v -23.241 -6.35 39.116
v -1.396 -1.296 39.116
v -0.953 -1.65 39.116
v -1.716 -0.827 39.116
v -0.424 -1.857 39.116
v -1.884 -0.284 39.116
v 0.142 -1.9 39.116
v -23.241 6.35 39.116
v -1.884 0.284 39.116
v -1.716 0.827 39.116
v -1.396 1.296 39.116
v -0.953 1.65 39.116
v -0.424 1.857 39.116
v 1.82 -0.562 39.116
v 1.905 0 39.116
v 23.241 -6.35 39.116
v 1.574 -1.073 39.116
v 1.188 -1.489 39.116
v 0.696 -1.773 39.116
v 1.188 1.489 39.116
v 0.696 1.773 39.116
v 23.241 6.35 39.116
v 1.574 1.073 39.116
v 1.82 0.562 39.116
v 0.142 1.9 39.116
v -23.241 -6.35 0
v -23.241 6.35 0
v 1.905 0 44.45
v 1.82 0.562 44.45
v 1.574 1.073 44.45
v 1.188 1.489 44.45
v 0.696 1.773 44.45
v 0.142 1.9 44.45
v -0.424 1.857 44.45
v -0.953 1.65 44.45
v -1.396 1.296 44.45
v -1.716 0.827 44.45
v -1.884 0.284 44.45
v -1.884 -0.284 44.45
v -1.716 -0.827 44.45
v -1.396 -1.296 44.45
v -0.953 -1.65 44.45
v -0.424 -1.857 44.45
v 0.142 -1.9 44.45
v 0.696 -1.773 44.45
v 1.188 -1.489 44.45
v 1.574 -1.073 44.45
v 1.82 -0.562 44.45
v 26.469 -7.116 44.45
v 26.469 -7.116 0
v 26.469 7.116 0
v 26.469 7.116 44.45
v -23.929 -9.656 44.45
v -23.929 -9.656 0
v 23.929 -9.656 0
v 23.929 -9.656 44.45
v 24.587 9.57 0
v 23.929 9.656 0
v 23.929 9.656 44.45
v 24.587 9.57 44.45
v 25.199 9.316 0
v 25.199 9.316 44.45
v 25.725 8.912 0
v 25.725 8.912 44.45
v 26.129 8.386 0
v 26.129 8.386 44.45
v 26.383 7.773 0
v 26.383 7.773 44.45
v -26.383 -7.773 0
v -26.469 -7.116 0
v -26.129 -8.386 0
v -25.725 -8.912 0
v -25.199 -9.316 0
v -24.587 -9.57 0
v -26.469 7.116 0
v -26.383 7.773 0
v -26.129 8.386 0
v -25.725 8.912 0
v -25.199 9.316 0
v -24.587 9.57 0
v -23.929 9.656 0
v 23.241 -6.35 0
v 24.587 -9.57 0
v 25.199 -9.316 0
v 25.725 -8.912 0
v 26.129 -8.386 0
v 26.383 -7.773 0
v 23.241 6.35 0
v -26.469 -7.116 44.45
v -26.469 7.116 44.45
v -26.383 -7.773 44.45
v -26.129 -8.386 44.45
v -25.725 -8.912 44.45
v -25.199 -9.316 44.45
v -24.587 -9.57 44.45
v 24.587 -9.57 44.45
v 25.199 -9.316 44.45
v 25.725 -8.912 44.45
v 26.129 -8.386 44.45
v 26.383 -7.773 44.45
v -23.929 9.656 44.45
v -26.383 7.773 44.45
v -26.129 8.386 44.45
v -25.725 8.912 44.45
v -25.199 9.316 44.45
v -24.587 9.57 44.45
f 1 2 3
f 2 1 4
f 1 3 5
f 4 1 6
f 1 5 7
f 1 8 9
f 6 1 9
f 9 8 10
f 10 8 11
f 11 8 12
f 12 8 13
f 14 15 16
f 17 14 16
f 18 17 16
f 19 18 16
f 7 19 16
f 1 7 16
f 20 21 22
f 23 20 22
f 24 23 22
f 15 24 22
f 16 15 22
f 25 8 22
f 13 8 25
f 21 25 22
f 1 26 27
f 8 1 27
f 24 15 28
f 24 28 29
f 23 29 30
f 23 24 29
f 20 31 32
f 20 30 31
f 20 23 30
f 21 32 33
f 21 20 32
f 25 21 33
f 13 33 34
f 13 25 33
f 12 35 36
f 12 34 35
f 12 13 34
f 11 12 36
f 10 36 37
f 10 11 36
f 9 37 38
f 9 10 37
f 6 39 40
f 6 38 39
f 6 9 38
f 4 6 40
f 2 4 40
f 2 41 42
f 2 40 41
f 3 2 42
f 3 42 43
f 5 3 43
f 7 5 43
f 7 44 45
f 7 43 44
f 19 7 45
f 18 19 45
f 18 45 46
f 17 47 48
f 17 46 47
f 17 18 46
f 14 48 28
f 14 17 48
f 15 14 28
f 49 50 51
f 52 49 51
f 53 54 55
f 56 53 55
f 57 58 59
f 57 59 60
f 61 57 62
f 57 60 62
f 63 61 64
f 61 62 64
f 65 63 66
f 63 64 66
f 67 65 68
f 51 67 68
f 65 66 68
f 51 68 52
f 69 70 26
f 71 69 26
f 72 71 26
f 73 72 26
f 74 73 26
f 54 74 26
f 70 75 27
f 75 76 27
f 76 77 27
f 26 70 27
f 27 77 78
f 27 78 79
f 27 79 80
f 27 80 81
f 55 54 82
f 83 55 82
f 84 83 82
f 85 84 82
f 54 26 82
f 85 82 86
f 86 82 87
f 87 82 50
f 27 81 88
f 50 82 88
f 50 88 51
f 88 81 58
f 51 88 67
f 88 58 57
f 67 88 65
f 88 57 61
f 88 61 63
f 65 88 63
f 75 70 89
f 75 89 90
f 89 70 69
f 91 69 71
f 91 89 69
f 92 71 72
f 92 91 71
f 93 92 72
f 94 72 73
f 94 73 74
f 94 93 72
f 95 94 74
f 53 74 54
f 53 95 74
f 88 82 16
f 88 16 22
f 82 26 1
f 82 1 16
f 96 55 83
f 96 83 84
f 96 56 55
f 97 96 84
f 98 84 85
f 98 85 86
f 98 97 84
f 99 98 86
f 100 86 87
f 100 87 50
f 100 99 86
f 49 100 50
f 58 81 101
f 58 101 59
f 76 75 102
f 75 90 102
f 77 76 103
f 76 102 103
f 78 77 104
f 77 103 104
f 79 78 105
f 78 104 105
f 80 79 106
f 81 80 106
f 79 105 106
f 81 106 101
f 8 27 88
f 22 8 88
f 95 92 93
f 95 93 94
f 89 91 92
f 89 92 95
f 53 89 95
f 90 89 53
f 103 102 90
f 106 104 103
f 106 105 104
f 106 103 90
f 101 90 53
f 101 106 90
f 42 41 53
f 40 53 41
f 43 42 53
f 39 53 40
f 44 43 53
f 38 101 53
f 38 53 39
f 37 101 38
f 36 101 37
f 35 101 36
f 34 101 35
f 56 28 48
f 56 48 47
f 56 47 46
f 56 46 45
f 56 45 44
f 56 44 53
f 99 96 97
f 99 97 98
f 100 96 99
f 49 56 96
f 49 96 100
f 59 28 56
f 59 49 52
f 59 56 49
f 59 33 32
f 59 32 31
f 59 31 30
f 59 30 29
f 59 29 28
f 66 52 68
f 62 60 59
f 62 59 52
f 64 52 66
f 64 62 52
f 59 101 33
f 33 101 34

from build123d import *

# Parameters (mm, degrees)
F0_W     = 52.938428
F0_H     = 19.312158
F0_W_2   = 46.482
F0_H_2   = 12.7
F1_DEPTH = 44.45
F2_W     = 46.482
F2_H     = 12.7
F3_DEPTH = 39.116
F4_R     = 1.905
F5_DEPTH = 58.674
F6_R     = 2.54


with BuildPart() as f1:
    # F0 (on Top) → F1 (new body)
    with BuildSketch(Plane.XY):
        Rectangle(F0_W, F0_H)
        Rectangle(F0_W_2, F0_H_2, mode=Mode.SUBTRACT)
        Rectangle(F0_W_2, F0_H_2)
    extrude(amount=F1_DEPTH)

    # F2 (on Top) → F3 (cut)
    with BuildSketch(Plane.XY):
        Rectangle(F2_W, F2_H)
    extrude(amount=F3_DEPTH, mode=Mode.SUBTRACT)

    # F4 (on Top) → F5 (cut)
    with BuildSketch(Plane.XY):
        Circle(F4_R)
    extrude(amount=F5_DEPTH, mode=Mode.SUBTRACT)

    # F6
    f6_edges = [f1.edges().sort_by_distance(p)[0] for p in [
        (-26.469214, 9.656079, 22.225),
        (26.469214, 9.656079, 22.225),
        (-26.469214, -9.656079, 22.225),
        (26.469214, -9.656079, 22.225),
    ]]
    fillet(f6_edges, radius=F6_R)


solid = f1.part
